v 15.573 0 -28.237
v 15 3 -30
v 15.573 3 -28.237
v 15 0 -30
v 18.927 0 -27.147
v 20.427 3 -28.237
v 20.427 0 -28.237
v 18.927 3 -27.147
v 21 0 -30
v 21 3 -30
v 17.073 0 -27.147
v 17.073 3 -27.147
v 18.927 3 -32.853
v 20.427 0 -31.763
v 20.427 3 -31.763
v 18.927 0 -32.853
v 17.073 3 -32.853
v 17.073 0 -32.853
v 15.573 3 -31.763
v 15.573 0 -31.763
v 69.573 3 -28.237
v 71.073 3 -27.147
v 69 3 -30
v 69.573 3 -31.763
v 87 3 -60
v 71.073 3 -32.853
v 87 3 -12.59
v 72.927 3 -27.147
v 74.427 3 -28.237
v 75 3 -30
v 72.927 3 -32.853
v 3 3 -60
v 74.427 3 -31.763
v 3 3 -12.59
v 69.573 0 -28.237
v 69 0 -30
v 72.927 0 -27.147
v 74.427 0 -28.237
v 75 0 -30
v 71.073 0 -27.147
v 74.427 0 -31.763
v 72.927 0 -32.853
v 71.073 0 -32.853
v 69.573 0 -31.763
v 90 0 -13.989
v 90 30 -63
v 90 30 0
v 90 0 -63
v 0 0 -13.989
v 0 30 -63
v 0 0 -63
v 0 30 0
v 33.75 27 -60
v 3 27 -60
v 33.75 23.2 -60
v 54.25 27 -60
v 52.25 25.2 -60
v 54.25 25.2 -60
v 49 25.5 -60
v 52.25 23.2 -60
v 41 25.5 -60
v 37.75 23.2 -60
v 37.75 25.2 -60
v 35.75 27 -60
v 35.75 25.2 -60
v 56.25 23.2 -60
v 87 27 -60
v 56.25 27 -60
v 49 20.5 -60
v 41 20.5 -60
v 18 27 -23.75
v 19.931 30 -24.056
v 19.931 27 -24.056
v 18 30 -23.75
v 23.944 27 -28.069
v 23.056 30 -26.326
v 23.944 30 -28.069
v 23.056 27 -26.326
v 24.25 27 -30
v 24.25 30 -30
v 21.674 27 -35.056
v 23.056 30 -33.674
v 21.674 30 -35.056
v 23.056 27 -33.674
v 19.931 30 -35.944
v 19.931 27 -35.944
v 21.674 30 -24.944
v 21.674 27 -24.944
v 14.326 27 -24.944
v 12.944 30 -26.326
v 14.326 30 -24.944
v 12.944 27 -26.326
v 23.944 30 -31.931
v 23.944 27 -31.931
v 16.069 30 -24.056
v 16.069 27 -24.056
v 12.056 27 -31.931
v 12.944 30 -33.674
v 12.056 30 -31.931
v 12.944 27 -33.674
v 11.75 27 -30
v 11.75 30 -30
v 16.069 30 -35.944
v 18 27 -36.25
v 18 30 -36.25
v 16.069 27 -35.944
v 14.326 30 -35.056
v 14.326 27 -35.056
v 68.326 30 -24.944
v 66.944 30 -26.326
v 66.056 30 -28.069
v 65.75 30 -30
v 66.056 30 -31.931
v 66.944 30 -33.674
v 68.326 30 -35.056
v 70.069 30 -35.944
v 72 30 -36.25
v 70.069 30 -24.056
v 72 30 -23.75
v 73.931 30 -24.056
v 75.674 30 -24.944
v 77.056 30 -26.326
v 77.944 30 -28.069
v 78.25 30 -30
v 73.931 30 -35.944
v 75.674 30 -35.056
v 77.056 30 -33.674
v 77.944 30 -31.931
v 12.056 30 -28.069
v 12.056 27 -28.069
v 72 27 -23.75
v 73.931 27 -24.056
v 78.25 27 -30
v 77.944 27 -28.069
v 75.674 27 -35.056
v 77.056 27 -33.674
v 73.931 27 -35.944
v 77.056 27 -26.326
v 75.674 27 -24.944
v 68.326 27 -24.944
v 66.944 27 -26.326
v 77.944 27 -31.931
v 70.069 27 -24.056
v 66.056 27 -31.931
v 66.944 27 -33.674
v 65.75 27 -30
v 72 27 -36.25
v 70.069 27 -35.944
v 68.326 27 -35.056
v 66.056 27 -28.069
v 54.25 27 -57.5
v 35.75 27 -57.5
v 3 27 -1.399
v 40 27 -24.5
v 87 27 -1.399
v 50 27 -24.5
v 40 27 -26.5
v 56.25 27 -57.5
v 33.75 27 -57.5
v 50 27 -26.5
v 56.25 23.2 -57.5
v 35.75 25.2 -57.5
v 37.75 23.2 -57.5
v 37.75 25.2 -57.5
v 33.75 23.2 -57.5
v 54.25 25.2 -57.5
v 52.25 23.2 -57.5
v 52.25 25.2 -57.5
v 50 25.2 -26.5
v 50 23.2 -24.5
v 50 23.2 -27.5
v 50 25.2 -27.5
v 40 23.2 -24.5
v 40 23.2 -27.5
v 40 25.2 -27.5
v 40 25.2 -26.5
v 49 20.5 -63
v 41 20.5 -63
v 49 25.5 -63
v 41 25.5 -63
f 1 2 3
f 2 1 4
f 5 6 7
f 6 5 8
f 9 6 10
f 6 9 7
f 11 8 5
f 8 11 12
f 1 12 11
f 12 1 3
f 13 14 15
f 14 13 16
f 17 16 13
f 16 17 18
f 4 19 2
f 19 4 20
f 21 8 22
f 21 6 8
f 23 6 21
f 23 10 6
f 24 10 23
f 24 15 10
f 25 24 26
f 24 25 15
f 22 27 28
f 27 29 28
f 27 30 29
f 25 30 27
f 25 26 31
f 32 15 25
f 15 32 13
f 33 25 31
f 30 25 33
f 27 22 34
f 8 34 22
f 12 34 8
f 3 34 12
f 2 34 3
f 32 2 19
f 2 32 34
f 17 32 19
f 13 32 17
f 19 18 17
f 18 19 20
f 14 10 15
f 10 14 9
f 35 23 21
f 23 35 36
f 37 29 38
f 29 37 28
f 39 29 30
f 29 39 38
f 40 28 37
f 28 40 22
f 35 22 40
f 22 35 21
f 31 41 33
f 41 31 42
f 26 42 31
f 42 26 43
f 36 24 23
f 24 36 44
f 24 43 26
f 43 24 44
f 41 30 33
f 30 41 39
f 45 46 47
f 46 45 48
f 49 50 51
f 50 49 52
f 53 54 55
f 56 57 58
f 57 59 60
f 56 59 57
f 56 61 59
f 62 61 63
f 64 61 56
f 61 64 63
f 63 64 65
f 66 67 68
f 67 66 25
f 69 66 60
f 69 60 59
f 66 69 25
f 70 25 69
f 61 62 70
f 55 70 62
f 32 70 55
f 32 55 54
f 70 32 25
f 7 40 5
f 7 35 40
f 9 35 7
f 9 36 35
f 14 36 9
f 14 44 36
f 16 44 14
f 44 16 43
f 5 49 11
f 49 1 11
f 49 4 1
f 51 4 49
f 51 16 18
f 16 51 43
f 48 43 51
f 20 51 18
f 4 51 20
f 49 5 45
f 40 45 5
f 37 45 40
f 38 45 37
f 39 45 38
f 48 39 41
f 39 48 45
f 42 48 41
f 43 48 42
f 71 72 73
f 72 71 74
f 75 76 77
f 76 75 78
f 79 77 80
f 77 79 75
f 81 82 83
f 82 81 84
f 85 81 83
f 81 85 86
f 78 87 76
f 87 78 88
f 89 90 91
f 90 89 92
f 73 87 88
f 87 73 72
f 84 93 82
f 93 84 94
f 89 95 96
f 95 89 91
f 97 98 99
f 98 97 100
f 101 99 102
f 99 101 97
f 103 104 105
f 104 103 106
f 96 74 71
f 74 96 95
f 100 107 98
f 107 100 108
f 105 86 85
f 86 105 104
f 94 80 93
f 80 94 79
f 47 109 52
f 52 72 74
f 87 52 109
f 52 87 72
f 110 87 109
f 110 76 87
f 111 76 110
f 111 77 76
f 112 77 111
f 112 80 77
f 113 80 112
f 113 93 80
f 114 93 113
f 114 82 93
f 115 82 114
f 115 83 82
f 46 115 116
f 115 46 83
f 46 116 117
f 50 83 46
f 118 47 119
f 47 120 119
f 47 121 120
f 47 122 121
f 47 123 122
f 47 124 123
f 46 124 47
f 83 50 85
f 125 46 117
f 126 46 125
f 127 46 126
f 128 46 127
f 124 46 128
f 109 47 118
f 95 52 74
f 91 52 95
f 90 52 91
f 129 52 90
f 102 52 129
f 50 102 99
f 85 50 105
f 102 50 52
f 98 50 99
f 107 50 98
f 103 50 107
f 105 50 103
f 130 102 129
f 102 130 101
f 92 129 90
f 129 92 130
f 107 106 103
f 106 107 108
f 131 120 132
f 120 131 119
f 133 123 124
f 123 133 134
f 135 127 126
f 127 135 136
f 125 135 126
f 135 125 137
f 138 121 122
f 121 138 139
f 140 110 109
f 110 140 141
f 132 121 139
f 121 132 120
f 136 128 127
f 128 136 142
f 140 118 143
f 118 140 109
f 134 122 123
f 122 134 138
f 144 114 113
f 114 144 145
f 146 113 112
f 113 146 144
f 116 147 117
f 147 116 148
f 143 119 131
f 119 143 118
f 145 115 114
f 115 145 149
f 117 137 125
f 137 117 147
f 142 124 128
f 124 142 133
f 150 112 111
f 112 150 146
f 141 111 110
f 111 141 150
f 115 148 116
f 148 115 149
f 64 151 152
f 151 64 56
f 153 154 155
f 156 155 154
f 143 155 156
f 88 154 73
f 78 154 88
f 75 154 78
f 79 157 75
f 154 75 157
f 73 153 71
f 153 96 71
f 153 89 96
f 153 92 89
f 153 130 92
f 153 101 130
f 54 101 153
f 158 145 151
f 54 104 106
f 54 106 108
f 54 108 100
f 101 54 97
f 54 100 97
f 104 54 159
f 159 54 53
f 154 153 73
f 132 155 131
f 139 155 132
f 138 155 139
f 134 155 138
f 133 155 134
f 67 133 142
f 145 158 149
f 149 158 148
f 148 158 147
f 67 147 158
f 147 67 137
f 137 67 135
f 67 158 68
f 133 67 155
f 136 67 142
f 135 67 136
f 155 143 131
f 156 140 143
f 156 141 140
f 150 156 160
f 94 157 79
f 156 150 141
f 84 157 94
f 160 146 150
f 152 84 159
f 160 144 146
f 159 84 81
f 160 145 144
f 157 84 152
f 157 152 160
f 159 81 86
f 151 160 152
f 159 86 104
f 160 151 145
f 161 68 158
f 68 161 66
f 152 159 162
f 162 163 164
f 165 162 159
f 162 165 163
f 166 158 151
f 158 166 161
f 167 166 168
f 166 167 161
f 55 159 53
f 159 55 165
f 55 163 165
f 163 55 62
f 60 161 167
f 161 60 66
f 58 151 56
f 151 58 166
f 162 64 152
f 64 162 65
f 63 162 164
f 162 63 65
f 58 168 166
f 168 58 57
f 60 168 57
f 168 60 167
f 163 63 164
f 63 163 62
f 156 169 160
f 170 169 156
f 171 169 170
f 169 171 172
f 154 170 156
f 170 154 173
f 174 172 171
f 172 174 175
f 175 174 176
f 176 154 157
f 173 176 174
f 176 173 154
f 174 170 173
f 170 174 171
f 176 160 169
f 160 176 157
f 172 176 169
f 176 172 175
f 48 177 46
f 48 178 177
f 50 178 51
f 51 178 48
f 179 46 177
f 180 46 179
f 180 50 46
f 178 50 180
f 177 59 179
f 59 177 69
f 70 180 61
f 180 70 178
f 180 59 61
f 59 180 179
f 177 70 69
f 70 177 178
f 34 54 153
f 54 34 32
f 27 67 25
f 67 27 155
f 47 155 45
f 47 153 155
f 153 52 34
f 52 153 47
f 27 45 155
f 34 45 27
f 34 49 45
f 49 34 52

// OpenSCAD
BODY_DEPTH = 3;
BODY_WIDTH = 90;
BODY_HEIGHT = 30;
BODY_LENGTH = 60;
MICROUSB_WIDTH = 8;
MICROUSB_HEIGHT = 5;
PROMICRO_WIDTH = 18.5;
PROMICRO_LENGTH = 33.5;
PROMICRO_HEIGHT = 1.8;
PROMICRO_SLOT_SIZE = 4;
PROMICRO_SLOT_HEIGHT = 2;
PROMICRO_SLOT_DEPTH = 2.5;
BACK_SLOT_SIZE = 1;
BACK_SLOT_WIDTH = 10;
SCREW_BOTTOM_SIZE = 6.25;
SCREW_TOP_SIZE = 3;
ANGLE = 25;

difference() {
    
union() {
// Top
difference() {
    rotate([270, 0, 0])
        cube(size = [BODY_WIDTH, BODY_LENGTH, BODY_DEPTH]);
    union() {
        rotate([90, 0, 0])
            translate([18, -BODY_LENGTH / 2, -BODY_DEPTH])
            cylinder(10, SCREW_TOP_SIZE, SCREW_TOP_SIZE);
            
        rotate([90, 0, 0])
            translate([BODY_WIDTH - 18, -BODY_LENGTH / 2, -BODY_DEPTH])
            cylinder(10, SCREW_TOP_SIZE, SCREW_TOP_SIZE);
    }
}
    
// Bottom
difference() {
    rotate([270, 0, 0])
        translate([0, 0, BODY_HEIGHT - BODY_DEPTH])
        cube(size = [BODY_WIDTH, BODY_LENGTH, BODY_DEPTH]);
    union() {
        rotate([90, 0, 0])
            translate([18, -BODY_LENGTH / 2, -BODY_HEIGHT])
            cylinder(10, SCREW_BOTTOM_SIZE, SCREW_BOTTOM_SIZE);
            
        rotate([90, 0, 0])
            translate([BODY_WIDTH - 18, -BODY_LENGTH / 2, -BODY_HEIGHT])
            cylinder(10, SCREW_BOTTOM_SIZE, SCREW_BOTTOM_SIZE);
    }
}
    
    // Side catches for Pro Micro PCB
difference() {
    difference() {  
        translate([(BODY_WIDTH - (PROMICRO_WIDTH + PROMICRO_SLOT_SIZE)) / 2, BODY_HEIGHT - (BODY_DEPTH + PROMICRO_HEIGHT + PROMICRO_SLOT_HEIGHT), -BODY_LENGTH])    
            cube(size = [PROMICRO_WIDTH + PROMICRO_SLOT_SIZE, PROMICRO_HEIGHT + PROMICRO_SLOT_HEIGHT, PROMICRO_SLOT_DEPTH]);
        translate([(BODY_WIDTH - PROMICRO_WIDTH) / 2, BODY_HEIGHT - (BODY_DEPTH + PROMICRO_HEIGHT), -BODY_LENGTH])    
            cube(size = [PROMICRO_WIDTH, PROMICRO_HEIGHT, PROMICRO_SLOT_DEPTH]);
    }

    translate([(BODY_WIDTH - (PROMICRO_WIDTH - PROMICRO_SLOT_SIZE)) / 2, BODY_HEIGHT - (BODY_DEPTH + 10), -BODY_LENGTH]) 
                cube(size = [PROMICRO_WIDTH - PROMICRO_SLOT_SIZE, 10, 10]);
}

    // Back catch for Pro Micro PCB
difference() {
    translate([(BODY_WIDTH - BACK_SLOT_WIDTH) / 2, BODY_HEIGHT - (PROMICRO_HEIGHT + BODY_DEPTH + PROMICRO_SLOT_HEIGHT), -BODY_LENGTH + (PROMICRO_LENGTH - BACK_SLOT_SIZE)])
        cube(size = [BACK_SLOT_WIDTH, PROMICRO_HEIGHT + PROMICRO_SLOT_HEIGHT, (BACK_SLOT_SIZE + PROMICRO_SLOT_HEIGHT)]);
    translate([(BODY_WIDTH - BACK_SLOT_WIDTH) / 2, BODY_HEIGHT - (PROMICRO_HEIGHT + BODY_DEPTH), -BODY_LENGTH + (PROMICRO_LENGTH - BACK_SLOT_SIZE)])
        cube(size = [BACK_SLOT_WIDTH, PROMICRO_HEIGHT, BACK_SLOT_SIZE]);
}
    // Pro Micro
//translate([(BODY_WIDTH - PROMICRO_WIDTH) / 2, BODY_HEIGHT - (PROMICRO_HEIGHT + BODY_DEPTH), -BODY_LENGTH])
    //cube(size = [PROMICRO_WIDTH, PROMICRO_HEIGHT, PROMICRO_LENGTH]);

    
// Sides
rotate([0, 90, 0])
    cube(size = [BODY_LENGTH, BODY_HEIGHT, BODY_DEPTH]);
    
rotate([0, 90, 0])
    translate([0, 0, BODY_WIDTH - BODY_DEPTH])
    cube(size = [BODY_LENGTH, BODY_HEIGHT, BODY_DEPTH]);

// Back
translate([0, 0, -BODY_LENGTH - BODY_DEPTH])
    difference() {
        cube(size = [BODY_WIDTH, BODY_HEIGHT, BODY_DEPTH]);
        translate([(BODY_WIDTH - MICROUSB_WIDTH) / 2, BODY_HEIGHT - 9.5, 0])
            cube(size = [MICROUSB_WIDTH, MICROUSB_HEIGHT, 10]);
    }
}
// Angling
translate([0, 30, 0])
rotate([90, 0, 0])
rotate([ANGLE, 0, 0])
    cube(size = [BODY_WIDTH, BODY_HEIGHT + 10, 100]);
}
